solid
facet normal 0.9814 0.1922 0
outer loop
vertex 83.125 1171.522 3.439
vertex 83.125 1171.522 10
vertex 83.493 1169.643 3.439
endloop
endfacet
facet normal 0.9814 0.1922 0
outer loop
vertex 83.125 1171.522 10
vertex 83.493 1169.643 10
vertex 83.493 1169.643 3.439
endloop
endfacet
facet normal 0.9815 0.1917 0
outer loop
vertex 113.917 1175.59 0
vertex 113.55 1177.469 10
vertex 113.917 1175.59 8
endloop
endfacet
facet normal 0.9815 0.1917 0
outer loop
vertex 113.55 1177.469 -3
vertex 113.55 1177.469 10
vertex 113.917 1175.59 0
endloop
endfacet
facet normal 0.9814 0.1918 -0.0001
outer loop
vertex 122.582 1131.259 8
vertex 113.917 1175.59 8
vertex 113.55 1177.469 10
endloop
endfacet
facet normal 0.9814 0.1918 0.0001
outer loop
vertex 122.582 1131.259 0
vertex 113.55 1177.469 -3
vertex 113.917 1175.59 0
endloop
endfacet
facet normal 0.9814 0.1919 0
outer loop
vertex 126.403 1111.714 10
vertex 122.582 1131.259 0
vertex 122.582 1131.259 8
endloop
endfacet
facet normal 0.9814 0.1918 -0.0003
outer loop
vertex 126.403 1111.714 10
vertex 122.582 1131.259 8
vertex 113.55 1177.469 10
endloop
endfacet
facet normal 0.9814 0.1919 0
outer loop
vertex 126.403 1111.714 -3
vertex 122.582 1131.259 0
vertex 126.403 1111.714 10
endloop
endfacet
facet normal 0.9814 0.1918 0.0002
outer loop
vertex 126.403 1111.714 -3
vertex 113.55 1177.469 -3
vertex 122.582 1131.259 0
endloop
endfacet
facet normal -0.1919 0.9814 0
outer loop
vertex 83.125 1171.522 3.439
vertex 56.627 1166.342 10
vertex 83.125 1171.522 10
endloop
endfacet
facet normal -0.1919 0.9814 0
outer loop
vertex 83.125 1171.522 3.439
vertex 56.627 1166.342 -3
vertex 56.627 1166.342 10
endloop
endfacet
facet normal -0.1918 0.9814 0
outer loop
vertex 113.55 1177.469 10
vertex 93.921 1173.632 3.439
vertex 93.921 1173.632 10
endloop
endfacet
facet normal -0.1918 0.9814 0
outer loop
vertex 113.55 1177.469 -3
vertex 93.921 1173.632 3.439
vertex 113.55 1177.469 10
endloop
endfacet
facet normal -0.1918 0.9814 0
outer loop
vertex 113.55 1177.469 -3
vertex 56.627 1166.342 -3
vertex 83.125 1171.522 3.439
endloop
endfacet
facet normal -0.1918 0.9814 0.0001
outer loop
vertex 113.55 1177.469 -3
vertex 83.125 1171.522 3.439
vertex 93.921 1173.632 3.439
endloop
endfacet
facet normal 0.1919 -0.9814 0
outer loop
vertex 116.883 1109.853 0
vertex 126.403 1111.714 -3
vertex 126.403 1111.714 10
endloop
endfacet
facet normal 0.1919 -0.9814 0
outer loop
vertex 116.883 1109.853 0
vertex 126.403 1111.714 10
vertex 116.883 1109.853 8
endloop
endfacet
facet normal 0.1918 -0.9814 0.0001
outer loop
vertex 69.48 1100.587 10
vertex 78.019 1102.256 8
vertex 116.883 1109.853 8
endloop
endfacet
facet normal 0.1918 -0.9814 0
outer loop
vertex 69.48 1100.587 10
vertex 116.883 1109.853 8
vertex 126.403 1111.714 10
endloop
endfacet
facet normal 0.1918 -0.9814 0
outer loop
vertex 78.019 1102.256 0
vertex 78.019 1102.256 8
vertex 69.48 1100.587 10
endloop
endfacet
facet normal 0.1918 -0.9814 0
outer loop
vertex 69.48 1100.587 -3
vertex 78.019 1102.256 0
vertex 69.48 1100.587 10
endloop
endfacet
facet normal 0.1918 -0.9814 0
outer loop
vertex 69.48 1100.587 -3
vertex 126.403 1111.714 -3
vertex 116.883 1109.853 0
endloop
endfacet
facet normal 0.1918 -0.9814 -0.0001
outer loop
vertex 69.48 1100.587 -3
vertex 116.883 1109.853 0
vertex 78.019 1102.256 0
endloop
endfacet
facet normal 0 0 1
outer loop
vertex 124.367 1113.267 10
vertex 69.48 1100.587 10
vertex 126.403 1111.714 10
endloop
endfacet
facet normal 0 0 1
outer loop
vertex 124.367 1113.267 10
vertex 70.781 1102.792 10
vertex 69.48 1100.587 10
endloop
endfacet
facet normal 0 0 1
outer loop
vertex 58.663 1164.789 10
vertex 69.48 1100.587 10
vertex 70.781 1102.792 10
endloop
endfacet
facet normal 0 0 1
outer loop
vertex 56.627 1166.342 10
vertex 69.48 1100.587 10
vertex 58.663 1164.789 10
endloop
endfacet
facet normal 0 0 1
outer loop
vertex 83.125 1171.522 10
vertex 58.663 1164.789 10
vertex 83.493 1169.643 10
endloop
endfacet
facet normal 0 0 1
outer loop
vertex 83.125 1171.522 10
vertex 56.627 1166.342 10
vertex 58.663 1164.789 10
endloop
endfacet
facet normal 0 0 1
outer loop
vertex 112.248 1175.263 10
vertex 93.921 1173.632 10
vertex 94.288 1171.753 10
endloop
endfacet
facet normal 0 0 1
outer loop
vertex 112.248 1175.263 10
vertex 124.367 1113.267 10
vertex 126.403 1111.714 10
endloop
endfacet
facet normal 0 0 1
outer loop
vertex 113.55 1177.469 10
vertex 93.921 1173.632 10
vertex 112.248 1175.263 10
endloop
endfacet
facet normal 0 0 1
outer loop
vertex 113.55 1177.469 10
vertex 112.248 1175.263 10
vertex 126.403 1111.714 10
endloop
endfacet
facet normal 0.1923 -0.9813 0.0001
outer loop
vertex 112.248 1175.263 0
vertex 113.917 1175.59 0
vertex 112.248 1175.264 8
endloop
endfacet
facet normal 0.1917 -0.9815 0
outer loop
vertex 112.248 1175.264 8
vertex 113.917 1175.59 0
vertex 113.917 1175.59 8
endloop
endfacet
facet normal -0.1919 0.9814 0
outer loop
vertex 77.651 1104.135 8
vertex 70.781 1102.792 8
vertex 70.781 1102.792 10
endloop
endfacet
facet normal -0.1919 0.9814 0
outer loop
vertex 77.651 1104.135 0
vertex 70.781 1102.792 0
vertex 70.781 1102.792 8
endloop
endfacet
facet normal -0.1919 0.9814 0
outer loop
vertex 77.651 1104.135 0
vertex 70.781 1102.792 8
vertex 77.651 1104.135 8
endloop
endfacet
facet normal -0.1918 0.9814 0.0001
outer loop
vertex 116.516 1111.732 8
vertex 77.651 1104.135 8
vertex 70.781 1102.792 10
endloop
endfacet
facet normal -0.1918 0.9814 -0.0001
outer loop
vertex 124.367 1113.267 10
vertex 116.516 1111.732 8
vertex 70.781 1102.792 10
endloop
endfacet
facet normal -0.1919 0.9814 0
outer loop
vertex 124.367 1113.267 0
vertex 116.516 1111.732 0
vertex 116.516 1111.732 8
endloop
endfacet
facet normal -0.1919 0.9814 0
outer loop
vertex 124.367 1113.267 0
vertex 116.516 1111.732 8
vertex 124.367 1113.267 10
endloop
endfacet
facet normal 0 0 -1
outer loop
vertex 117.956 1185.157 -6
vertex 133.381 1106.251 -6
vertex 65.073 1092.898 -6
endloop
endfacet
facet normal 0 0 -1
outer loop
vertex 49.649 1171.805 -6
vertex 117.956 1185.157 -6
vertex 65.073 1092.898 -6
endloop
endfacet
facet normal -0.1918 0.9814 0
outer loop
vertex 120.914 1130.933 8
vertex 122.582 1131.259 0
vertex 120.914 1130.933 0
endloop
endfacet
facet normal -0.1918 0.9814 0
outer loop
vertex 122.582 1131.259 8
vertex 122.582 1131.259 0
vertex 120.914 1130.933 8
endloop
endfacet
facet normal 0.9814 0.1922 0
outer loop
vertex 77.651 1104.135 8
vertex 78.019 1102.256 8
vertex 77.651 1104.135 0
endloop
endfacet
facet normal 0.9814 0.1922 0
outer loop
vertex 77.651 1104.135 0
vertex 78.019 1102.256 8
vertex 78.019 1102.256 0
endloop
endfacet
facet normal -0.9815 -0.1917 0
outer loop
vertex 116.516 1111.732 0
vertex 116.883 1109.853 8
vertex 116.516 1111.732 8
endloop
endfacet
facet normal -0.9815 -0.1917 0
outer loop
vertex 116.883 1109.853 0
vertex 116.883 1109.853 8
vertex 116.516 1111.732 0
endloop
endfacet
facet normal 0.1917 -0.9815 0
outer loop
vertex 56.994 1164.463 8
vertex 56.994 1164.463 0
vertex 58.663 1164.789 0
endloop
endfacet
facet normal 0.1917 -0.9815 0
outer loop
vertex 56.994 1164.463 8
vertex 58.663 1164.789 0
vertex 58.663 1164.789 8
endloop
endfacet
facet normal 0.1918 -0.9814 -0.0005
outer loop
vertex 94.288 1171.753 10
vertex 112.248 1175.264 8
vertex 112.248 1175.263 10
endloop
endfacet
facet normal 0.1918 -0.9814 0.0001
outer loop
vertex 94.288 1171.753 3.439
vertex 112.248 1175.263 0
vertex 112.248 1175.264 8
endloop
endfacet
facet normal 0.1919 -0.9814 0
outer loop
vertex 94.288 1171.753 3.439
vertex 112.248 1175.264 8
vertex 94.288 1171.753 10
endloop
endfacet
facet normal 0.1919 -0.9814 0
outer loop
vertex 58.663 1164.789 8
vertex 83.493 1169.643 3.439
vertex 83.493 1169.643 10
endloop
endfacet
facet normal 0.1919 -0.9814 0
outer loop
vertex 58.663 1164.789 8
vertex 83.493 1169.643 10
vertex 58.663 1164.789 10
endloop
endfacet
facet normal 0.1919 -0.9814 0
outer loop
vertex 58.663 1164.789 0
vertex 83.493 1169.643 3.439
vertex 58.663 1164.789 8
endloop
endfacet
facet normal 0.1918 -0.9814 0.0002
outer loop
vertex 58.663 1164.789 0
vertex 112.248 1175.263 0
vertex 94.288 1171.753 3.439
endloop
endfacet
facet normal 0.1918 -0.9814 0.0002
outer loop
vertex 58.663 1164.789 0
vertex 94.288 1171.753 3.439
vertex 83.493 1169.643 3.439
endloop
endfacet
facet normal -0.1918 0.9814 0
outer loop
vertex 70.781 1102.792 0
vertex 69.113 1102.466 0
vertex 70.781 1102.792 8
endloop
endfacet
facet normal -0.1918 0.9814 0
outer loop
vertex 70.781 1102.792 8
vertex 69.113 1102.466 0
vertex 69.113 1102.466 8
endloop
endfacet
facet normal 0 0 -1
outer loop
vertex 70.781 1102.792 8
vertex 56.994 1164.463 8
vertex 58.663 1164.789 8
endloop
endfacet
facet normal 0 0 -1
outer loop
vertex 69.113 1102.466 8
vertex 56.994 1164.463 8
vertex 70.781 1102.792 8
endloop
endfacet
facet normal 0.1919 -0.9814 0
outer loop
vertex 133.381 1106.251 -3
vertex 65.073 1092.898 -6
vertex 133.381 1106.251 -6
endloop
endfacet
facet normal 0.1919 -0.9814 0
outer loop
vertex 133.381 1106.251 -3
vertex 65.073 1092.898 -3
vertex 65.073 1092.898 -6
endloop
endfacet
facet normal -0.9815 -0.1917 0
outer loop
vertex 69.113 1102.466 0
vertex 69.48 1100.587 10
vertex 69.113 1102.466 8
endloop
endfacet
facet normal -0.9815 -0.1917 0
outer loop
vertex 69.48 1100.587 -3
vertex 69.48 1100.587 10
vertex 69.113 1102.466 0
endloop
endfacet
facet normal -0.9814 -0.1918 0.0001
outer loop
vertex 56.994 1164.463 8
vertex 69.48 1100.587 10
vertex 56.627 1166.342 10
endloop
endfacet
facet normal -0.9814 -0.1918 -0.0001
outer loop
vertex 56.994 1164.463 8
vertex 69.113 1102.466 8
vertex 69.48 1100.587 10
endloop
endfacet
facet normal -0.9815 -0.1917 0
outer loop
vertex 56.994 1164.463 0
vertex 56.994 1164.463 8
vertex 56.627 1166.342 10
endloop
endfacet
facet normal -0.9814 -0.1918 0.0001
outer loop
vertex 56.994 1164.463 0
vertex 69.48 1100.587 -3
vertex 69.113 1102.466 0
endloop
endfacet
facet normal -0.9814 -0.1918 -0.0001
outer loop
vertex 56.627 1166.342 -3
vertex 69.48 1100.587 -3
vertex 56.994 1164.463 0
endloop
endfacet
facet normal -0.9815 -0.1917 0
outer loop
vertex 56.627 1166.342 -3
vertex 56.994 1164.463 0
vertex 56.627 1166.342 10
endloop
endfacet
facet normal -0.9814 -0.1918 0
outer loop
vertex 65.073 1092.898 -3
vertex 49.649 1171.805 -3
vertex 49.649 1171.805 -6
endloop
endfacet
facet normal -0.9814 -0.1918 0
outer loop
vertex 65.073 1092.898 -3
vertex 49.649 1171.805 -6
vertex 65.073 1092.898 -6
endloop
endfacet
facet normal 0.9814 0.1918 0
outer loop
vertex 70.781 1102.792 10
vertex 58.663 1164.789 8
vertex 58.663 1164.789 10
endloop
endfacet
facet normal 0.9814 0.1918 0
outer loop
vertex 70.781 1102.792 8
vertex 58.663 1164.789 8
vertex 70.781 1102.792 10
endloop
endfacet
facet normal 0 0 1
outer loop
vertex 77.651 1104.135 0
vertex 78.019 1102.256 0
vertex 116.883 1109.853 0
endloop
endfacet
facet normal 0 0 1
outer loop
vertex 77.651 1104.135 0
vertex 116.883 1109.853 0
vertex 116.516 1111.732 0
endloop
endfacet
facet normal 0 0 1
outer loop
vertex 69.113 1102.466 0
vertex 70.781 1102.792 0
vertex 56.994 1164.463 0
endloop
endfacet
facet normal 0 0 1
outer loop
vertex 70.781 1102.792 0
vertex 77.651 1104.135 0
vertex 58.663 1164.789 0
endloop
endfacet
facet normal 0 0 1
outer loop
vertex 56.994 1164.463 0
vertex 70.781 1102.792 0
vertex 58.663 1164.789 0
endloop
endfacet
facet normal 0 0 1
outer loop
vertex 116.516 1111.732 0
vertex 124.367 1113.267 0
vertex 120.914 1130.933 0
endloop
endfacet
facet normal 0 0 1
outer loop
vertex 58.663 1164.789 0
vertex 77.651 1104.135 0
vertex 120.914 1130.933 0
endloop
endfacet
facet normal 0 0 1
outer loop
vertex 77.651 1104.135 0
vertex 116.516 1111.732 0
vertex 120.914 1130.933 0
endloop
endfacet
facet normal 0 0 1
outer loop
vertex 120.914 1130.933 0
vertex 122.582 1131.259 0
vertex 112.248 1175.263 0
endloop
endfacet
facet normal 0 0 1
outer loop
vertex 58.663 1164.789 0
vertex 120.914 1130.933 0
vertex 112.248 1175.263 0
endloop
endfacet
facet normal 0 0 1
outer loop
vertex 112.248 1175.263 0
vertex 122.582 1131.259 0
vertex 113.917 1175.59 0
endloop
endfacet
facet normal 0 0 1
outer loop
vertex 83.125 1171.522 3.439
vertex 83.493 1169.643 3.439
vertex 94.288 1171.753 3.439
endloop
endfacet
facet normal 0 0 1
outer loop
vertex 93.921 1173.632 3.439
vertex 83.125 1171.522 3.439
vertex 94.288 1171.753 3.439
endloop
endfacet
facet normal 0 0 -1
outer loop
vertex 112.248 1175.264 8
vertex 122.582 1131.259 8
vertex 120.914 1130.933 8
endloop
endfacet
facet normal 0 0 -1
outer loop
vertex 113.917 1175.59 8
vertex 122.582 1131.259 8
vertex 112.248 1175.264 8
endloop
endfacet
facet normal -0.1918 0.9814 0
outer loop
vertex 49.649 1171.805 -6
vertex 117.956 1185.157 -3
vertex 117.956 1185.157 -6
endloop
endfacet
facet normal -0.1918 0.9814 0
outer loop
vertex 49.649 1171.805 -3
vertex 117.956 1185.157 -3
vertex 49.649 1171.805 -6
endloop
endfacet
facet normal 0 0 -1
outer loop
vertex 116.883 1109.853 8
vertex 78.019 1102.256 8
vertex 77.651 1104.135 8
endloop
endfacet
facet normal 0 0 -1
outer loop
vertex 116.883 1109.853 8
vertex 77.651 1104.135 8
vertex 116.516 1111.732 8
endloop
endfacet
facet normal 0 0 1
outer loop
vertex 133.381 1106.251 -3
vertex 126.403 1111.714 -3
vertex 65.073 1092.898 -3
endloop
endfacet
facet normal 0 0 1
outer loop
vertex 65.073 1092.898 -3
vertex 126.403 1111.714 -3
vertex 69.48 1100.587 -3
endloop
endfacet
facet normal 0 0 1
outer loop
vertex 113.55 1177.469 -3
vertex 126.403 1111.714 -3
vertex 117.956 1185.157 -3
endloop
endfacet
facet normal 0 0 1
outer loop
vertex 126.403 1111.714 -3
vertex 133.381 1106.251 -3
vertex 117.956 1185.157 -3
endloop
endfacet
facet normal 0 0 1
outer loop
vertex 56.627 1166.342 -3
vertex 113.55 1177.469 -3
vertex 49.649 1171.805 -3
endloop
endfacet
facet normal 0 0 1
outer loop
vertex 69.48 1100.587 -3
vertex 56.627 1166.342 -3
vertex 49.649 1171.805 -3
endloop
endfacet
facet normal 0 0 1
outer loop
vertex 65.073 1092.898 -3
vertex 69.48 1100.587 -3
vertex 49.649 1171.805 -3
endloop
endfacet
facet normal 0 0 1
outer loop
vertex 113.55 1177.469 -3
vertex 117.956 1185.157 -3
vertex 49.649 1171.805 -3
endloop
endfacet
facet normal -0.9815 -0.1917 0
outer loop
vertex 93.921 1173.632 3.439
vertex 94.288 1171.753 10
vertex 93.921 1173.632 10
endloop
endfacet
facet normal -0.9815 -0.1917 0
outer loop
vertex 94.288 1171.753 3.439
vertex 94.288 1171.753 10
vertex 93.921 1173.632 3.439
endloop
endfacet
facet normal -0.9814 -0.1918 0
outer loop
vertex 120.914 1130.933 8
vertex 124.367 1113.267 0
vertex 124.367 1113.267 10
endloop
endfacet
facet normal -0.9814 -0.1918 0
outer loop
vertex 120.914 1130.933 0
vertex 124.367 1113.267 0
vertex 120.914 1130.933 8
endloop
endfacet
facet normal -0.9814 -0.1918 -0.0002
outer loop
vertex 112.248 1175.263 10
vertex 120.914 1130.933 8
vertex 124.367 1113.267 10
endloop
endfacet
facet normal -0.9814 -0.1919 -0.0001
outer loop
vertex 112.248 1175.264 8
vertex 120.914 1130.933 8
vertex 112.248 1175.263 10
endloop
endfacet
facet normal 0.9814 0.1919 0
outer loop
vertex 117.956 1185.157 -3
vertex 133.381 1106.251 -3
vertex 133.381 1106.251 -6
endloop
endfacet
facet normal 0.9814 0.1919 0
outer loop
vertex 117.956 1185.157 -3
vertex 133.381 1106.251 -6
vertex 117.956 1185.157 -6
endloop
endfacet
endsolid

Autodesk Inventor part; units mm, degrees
ref_plane "YZ Plane" through (0, 0, 0) normal (1, 0, 0) x (0, 1, 0)
ref_plane "XZ Plane" through (0, 0, 0) normal (0, 1, 0) x (-1, 0, 0)
ref_plane "XY Plane" through (0, 0, 0) normal (0, 0, 1) x (1, 0, 0)
ref_plane "Work Plane1" through (80.3117, 823.0211, 0) normal (0, 0, 1) x (0.9814259, 0.1918418, 0)
sketch "Sketch1" plane through (80.3117, 823.0211, 0) normal (0, 0, 1) x (0.9814259, 0.1918418, 0)
  line L0 (98.9183, 339.573) -> (44.3184, 339.573)
  line L1 (44.3184, 339.573) -> (44.3184, 276.403)
  line L2 (44.3184, 276.403) -> (98.9183, 276.403)
  line L3 (98.9183, 276.403) -> (98.9183, 339.573)
  line L4 (98.9183, 339.573) -> (44.3184, 276.403)
  line L5 (42.6184, 341.488) -> (100.6184, 341.488)
  line L6 (100.6184, 341.488) -> (100.6184, 274.488)
  line L7 (100.6184, 274.488) -> (42.6184, 274.488)
  line L8 (42.6184, 274.488) -> (42.6184, 341.488)
  line L9 (42.6184, 341.488) -> (100.6184, 274.488) construction
  line L10 (100.6184, 341.488) -> (42.6184, 274.488) construction
  line L11 (98.9183, 339.573) -> (44.3184, 339.573)
  line L12 (44.3184, 339.573) -> (44.3184, 276.403)
  line L13 (44.3184, 276.403) -> (98.9183, 276.403)
  line L14 (98.9183, 276.403) -> (98.9183, 339.573)
  line L15 (98.9183, 339.573) -> (44.3184, 276.403)
  line L16 (42.6184, 341.488) -> (100.6184, 341.488)
  line L17 (100.6184, 341.488) -> (100.6184, 274.488)
  line L18 (100.6184, 274.488) -> (42.6184, 274.488)
  line L19 (42.6184, 274.488) -> (42.6184, 341.488)
  line L20 (42.6184, 341.488) -> (100.6184, 274.488) construction
  line L21 (100.6184, 341.488) -> (42.6184, 274.488) construction
  point P0 (-236.7099, -792.3271)
  point P1 (71.6184, 307.988)
  point P2 (0, 0)
  point P3 (71.6184, 307.988)
  dimension "d0" = 58
  dimension "d1" = 67
  dimension "d2" = 58
  dimension "d3" = 67
sketch "Sketch2" plane through (80.3117, 823.0211, 0) normal (0, 0, 1) x (0.9814259, 0.1918418, 0)
  line L0 (98.9183, 339.573) -> (44.3184, 339.573)
  line L1 (44.3184, 339.573) -> (44.3184, 276.403)
  line L2 (44.3184, 276.403) -> (98.9183, 276.403)
  line L3 (98.9183, 276.403) -> (98.9183, 339.573)
  line L4 (42.6184, 341.488) -> (100.6184, 341.488)
  line L5 (100.6184, 341.488) -> (100.6184, 274.488)
  line L6 (100.6184, 274.488) -> (42.6184, 274.488)
  line L7 (42.6184, 274.488) -> (42.6184, 341.488)
  line L8 (42.6184, 341.488) -> (100.6184, 274.488) construction
  line L9 (100.6184, 341.488) -> (42.6184, 274.488) construction
  line L10 (98.9183, 339.573) -> (44.3184, 339.573)
  line L11 (44.3184, 339.573) -> (44.3184, 276.403)
  line L12 (44.3184, 276.403) -> (98.9183, 276.403)
  line L13 (98.9183, 276.403) -> (98.9183, 339.573)
  line L14 (42.6184, 341.488) -> (100.6184, 341.488)
  line L15 (100.6184, 341.488) -> (100.6184, 274.488)
  line L16 (100.6184, 274.488) -> (42.6184, 274.488)
  line L17 (42.6184, 274.488) -> (42.6184, 341.488)
  line L18 (42.6184, 341.488) -> (100.6184, 274.488) construction
  line L19 (100.6184, 341.488) -> (42.6184, 274.488) construction
  point P0 (-236.7099, -792.3271)
  point P1 (0, 0)
  point P2 (71.6184, 307.988)
  point P3 (0, 0)
  point P4 (71.6184, 307.988)
  dimension "d4" = 58
  dimension "d5" = 67
  dimension "d6" = 58
  dimension "d7" = 67
extrude "Extrusion1" add sketch "Sketch1" along normal blind 10
extrude "Extrusion3" add sketch "Sketch2" against normal blind 3 contours L3 L2 L1 L0 | L4 L5 L6 L7
sketch "Sketch4" plane through (69.4802, 1100.5867, -3) normal (-0.9814259, -0.1918418, 0) x (0, 0, 1)
  line L0 (3, 65.085) -> (13, 65.085) projected
  line L1 (3, 1.915) -> (13, 1.915) projected
  line L2 (3, 65.085) -> (11, 65.085)
  line L3 (11, 65.085) -> (11, 1.915)
  line L4 (11, 1.915) -> (3, 1.915)
  line L5 (3, 1.915) -> (3, 65.085)
  point P0 (3, -1066.8151)
  dimension "d14" = 8
extrude "Extrusion4" cut sketch "Sketch4" against normal blind 3
sketch "Sketch5" plane through (126.4029, 1111.7135, -3) normal (0.1918418, -0.9814259, 0) x (0.9814259, 0.1918418, 0)
  line L0 (-56.3, 5) -> (-56.3, 3) projected
  line L1 (-41.56, 9.2) -> (-44.06, 9.2) projected
  line L2 (-14.575, 10) -> (-14.575, 9.2) projected
  line L3 (-9.7, 11) -> (-9.7, 3)
  line L4 (-46.3, 11) -> (-9.7, 11)
  line L5 (-9.7, 3) -> (-46.3, 3)
  line L6 (-58, 3) -> (-1.7, 3) projected
  line L7 (-46.3, 11) -> (-43.3, 11)
  line L8 (-43.3, 3) -> (-46.3, 3)
  line L9 (-46.3, 11) -> (-49.3, 11)
  line L10 (-49.3, 11) -> (-49.3, 3)
  line L11 (-49.3, 3) -> (-46.3, 3)
  point P0 (-337.3282, 3)
  dimension "d22" = 8
  dimension "d24" = 8
  dimension "d33" = 3
  dimension "d34" = 3
extrude "Extrusion5" cut sketch "Sketch5" against normal blind 3
sketch "Sketch6" plane through (113.5495, 1177.4691, 10) normal (0.9814259, 0.1918418, 0) x (0, 0, -1)
  line L0 (8, -44.46) -> (3, -44.46)
  line L1 (2, -65.085) -> (2, -1.915) projected
  line L2 (2, -65.085) -> (10, -65.085)
  line L3 (10, -65.085) -> (10, -47.085)
  line L4 (10, -47.085) -> (2, -47.085)
  line L5 (2, -47.085) -> (2, -65.085)
  line L6 (10, -65.085) -> (10, -1.915) projected
  line L7 (2, -47.085) -> (10, -47.085)
  line L8 (10, -47.085) -> (10, -1.915)
  line L9 (10, -1.915) -> (2, -1.915)
  line L10 (2, -1.915) -> (2, -47.085)
  point P0 (10, -1133.8151)
  dimension "d25" = 8
  dimension "d26" = 18
extrude "Extrusion6" cut sketch "Sketch6" against normal blind 3 contours L1 L9 L6 L4
sketch "Sketch7" plane through (56.9942, 1164.4628, 0) normal (0.1918418, -0.9814259, 0) x (0.9814259, 0.1918418, 0)
  line L0 (28.4907, 10.1469) -> (28.4907, 10.1469) projected
  line L1 (27, 8) -> (27, 3.4394)
  line L2 (27, 3.4394) -> (38, 3.4394)
  line L3 (38, 3.4394) -> (38, 8)
  line L4 (38, 3.4394) -> (27, 3.4394)
  line L5 (27, 3.4394) -> (27, 13.4394)
  line L6 (27, 13.4394) -> (38, 13.4394)
  line L7 (38, 13.4394) -> (38, 3.4394)
  point P0 (-279.3282, 0)
  point P1 (35.9907, 10.1469)
  dimension "d29" = 11
  dimension "d32" = 10
extrude "Extrusion7" cut sketch "Sketch7" against normal blind 3
sketch "Sketch8" plane through (80.3117, 823.0211, -3) normal (0, 0, -1) x (-0.9814259, -0.1918418, 0)
  line L0 (-42.6184, 341.488) -> (-100.6184, 341.488) projected
  line L1 (-100.6184, 341.488) -> (-100.6184, 274.488) projected
  line L2 (-42.6184, 274.488) -> (-42.6184, 341.488) projected
  line L3 (-100.6184, 274.488) -> (-42.6184, 274.488) projected
  line L4 (-106.4184, 348.188) -> (-36.8184, 348.188)
  line L5 (-36.8184, 348.188) -> (-36.8184, 267.788)
  line L6 (-36.8184, 267.788) -> (-106.4184, 267.788)
  line L7 (-106.4184, 267.788) -> (-106.4184, 348.188)
  point P0 (236.7099, -792.3271)
  point P1 (-71.6184, 341.488)
  point P2 (-71.6184, 307.988)
extrude "Extrusion8" add sketch "Sketch8" along normal blind 3 contours L2 L3 L1 L0 | L4 L5 L6 L7
properties part number "Syno"
